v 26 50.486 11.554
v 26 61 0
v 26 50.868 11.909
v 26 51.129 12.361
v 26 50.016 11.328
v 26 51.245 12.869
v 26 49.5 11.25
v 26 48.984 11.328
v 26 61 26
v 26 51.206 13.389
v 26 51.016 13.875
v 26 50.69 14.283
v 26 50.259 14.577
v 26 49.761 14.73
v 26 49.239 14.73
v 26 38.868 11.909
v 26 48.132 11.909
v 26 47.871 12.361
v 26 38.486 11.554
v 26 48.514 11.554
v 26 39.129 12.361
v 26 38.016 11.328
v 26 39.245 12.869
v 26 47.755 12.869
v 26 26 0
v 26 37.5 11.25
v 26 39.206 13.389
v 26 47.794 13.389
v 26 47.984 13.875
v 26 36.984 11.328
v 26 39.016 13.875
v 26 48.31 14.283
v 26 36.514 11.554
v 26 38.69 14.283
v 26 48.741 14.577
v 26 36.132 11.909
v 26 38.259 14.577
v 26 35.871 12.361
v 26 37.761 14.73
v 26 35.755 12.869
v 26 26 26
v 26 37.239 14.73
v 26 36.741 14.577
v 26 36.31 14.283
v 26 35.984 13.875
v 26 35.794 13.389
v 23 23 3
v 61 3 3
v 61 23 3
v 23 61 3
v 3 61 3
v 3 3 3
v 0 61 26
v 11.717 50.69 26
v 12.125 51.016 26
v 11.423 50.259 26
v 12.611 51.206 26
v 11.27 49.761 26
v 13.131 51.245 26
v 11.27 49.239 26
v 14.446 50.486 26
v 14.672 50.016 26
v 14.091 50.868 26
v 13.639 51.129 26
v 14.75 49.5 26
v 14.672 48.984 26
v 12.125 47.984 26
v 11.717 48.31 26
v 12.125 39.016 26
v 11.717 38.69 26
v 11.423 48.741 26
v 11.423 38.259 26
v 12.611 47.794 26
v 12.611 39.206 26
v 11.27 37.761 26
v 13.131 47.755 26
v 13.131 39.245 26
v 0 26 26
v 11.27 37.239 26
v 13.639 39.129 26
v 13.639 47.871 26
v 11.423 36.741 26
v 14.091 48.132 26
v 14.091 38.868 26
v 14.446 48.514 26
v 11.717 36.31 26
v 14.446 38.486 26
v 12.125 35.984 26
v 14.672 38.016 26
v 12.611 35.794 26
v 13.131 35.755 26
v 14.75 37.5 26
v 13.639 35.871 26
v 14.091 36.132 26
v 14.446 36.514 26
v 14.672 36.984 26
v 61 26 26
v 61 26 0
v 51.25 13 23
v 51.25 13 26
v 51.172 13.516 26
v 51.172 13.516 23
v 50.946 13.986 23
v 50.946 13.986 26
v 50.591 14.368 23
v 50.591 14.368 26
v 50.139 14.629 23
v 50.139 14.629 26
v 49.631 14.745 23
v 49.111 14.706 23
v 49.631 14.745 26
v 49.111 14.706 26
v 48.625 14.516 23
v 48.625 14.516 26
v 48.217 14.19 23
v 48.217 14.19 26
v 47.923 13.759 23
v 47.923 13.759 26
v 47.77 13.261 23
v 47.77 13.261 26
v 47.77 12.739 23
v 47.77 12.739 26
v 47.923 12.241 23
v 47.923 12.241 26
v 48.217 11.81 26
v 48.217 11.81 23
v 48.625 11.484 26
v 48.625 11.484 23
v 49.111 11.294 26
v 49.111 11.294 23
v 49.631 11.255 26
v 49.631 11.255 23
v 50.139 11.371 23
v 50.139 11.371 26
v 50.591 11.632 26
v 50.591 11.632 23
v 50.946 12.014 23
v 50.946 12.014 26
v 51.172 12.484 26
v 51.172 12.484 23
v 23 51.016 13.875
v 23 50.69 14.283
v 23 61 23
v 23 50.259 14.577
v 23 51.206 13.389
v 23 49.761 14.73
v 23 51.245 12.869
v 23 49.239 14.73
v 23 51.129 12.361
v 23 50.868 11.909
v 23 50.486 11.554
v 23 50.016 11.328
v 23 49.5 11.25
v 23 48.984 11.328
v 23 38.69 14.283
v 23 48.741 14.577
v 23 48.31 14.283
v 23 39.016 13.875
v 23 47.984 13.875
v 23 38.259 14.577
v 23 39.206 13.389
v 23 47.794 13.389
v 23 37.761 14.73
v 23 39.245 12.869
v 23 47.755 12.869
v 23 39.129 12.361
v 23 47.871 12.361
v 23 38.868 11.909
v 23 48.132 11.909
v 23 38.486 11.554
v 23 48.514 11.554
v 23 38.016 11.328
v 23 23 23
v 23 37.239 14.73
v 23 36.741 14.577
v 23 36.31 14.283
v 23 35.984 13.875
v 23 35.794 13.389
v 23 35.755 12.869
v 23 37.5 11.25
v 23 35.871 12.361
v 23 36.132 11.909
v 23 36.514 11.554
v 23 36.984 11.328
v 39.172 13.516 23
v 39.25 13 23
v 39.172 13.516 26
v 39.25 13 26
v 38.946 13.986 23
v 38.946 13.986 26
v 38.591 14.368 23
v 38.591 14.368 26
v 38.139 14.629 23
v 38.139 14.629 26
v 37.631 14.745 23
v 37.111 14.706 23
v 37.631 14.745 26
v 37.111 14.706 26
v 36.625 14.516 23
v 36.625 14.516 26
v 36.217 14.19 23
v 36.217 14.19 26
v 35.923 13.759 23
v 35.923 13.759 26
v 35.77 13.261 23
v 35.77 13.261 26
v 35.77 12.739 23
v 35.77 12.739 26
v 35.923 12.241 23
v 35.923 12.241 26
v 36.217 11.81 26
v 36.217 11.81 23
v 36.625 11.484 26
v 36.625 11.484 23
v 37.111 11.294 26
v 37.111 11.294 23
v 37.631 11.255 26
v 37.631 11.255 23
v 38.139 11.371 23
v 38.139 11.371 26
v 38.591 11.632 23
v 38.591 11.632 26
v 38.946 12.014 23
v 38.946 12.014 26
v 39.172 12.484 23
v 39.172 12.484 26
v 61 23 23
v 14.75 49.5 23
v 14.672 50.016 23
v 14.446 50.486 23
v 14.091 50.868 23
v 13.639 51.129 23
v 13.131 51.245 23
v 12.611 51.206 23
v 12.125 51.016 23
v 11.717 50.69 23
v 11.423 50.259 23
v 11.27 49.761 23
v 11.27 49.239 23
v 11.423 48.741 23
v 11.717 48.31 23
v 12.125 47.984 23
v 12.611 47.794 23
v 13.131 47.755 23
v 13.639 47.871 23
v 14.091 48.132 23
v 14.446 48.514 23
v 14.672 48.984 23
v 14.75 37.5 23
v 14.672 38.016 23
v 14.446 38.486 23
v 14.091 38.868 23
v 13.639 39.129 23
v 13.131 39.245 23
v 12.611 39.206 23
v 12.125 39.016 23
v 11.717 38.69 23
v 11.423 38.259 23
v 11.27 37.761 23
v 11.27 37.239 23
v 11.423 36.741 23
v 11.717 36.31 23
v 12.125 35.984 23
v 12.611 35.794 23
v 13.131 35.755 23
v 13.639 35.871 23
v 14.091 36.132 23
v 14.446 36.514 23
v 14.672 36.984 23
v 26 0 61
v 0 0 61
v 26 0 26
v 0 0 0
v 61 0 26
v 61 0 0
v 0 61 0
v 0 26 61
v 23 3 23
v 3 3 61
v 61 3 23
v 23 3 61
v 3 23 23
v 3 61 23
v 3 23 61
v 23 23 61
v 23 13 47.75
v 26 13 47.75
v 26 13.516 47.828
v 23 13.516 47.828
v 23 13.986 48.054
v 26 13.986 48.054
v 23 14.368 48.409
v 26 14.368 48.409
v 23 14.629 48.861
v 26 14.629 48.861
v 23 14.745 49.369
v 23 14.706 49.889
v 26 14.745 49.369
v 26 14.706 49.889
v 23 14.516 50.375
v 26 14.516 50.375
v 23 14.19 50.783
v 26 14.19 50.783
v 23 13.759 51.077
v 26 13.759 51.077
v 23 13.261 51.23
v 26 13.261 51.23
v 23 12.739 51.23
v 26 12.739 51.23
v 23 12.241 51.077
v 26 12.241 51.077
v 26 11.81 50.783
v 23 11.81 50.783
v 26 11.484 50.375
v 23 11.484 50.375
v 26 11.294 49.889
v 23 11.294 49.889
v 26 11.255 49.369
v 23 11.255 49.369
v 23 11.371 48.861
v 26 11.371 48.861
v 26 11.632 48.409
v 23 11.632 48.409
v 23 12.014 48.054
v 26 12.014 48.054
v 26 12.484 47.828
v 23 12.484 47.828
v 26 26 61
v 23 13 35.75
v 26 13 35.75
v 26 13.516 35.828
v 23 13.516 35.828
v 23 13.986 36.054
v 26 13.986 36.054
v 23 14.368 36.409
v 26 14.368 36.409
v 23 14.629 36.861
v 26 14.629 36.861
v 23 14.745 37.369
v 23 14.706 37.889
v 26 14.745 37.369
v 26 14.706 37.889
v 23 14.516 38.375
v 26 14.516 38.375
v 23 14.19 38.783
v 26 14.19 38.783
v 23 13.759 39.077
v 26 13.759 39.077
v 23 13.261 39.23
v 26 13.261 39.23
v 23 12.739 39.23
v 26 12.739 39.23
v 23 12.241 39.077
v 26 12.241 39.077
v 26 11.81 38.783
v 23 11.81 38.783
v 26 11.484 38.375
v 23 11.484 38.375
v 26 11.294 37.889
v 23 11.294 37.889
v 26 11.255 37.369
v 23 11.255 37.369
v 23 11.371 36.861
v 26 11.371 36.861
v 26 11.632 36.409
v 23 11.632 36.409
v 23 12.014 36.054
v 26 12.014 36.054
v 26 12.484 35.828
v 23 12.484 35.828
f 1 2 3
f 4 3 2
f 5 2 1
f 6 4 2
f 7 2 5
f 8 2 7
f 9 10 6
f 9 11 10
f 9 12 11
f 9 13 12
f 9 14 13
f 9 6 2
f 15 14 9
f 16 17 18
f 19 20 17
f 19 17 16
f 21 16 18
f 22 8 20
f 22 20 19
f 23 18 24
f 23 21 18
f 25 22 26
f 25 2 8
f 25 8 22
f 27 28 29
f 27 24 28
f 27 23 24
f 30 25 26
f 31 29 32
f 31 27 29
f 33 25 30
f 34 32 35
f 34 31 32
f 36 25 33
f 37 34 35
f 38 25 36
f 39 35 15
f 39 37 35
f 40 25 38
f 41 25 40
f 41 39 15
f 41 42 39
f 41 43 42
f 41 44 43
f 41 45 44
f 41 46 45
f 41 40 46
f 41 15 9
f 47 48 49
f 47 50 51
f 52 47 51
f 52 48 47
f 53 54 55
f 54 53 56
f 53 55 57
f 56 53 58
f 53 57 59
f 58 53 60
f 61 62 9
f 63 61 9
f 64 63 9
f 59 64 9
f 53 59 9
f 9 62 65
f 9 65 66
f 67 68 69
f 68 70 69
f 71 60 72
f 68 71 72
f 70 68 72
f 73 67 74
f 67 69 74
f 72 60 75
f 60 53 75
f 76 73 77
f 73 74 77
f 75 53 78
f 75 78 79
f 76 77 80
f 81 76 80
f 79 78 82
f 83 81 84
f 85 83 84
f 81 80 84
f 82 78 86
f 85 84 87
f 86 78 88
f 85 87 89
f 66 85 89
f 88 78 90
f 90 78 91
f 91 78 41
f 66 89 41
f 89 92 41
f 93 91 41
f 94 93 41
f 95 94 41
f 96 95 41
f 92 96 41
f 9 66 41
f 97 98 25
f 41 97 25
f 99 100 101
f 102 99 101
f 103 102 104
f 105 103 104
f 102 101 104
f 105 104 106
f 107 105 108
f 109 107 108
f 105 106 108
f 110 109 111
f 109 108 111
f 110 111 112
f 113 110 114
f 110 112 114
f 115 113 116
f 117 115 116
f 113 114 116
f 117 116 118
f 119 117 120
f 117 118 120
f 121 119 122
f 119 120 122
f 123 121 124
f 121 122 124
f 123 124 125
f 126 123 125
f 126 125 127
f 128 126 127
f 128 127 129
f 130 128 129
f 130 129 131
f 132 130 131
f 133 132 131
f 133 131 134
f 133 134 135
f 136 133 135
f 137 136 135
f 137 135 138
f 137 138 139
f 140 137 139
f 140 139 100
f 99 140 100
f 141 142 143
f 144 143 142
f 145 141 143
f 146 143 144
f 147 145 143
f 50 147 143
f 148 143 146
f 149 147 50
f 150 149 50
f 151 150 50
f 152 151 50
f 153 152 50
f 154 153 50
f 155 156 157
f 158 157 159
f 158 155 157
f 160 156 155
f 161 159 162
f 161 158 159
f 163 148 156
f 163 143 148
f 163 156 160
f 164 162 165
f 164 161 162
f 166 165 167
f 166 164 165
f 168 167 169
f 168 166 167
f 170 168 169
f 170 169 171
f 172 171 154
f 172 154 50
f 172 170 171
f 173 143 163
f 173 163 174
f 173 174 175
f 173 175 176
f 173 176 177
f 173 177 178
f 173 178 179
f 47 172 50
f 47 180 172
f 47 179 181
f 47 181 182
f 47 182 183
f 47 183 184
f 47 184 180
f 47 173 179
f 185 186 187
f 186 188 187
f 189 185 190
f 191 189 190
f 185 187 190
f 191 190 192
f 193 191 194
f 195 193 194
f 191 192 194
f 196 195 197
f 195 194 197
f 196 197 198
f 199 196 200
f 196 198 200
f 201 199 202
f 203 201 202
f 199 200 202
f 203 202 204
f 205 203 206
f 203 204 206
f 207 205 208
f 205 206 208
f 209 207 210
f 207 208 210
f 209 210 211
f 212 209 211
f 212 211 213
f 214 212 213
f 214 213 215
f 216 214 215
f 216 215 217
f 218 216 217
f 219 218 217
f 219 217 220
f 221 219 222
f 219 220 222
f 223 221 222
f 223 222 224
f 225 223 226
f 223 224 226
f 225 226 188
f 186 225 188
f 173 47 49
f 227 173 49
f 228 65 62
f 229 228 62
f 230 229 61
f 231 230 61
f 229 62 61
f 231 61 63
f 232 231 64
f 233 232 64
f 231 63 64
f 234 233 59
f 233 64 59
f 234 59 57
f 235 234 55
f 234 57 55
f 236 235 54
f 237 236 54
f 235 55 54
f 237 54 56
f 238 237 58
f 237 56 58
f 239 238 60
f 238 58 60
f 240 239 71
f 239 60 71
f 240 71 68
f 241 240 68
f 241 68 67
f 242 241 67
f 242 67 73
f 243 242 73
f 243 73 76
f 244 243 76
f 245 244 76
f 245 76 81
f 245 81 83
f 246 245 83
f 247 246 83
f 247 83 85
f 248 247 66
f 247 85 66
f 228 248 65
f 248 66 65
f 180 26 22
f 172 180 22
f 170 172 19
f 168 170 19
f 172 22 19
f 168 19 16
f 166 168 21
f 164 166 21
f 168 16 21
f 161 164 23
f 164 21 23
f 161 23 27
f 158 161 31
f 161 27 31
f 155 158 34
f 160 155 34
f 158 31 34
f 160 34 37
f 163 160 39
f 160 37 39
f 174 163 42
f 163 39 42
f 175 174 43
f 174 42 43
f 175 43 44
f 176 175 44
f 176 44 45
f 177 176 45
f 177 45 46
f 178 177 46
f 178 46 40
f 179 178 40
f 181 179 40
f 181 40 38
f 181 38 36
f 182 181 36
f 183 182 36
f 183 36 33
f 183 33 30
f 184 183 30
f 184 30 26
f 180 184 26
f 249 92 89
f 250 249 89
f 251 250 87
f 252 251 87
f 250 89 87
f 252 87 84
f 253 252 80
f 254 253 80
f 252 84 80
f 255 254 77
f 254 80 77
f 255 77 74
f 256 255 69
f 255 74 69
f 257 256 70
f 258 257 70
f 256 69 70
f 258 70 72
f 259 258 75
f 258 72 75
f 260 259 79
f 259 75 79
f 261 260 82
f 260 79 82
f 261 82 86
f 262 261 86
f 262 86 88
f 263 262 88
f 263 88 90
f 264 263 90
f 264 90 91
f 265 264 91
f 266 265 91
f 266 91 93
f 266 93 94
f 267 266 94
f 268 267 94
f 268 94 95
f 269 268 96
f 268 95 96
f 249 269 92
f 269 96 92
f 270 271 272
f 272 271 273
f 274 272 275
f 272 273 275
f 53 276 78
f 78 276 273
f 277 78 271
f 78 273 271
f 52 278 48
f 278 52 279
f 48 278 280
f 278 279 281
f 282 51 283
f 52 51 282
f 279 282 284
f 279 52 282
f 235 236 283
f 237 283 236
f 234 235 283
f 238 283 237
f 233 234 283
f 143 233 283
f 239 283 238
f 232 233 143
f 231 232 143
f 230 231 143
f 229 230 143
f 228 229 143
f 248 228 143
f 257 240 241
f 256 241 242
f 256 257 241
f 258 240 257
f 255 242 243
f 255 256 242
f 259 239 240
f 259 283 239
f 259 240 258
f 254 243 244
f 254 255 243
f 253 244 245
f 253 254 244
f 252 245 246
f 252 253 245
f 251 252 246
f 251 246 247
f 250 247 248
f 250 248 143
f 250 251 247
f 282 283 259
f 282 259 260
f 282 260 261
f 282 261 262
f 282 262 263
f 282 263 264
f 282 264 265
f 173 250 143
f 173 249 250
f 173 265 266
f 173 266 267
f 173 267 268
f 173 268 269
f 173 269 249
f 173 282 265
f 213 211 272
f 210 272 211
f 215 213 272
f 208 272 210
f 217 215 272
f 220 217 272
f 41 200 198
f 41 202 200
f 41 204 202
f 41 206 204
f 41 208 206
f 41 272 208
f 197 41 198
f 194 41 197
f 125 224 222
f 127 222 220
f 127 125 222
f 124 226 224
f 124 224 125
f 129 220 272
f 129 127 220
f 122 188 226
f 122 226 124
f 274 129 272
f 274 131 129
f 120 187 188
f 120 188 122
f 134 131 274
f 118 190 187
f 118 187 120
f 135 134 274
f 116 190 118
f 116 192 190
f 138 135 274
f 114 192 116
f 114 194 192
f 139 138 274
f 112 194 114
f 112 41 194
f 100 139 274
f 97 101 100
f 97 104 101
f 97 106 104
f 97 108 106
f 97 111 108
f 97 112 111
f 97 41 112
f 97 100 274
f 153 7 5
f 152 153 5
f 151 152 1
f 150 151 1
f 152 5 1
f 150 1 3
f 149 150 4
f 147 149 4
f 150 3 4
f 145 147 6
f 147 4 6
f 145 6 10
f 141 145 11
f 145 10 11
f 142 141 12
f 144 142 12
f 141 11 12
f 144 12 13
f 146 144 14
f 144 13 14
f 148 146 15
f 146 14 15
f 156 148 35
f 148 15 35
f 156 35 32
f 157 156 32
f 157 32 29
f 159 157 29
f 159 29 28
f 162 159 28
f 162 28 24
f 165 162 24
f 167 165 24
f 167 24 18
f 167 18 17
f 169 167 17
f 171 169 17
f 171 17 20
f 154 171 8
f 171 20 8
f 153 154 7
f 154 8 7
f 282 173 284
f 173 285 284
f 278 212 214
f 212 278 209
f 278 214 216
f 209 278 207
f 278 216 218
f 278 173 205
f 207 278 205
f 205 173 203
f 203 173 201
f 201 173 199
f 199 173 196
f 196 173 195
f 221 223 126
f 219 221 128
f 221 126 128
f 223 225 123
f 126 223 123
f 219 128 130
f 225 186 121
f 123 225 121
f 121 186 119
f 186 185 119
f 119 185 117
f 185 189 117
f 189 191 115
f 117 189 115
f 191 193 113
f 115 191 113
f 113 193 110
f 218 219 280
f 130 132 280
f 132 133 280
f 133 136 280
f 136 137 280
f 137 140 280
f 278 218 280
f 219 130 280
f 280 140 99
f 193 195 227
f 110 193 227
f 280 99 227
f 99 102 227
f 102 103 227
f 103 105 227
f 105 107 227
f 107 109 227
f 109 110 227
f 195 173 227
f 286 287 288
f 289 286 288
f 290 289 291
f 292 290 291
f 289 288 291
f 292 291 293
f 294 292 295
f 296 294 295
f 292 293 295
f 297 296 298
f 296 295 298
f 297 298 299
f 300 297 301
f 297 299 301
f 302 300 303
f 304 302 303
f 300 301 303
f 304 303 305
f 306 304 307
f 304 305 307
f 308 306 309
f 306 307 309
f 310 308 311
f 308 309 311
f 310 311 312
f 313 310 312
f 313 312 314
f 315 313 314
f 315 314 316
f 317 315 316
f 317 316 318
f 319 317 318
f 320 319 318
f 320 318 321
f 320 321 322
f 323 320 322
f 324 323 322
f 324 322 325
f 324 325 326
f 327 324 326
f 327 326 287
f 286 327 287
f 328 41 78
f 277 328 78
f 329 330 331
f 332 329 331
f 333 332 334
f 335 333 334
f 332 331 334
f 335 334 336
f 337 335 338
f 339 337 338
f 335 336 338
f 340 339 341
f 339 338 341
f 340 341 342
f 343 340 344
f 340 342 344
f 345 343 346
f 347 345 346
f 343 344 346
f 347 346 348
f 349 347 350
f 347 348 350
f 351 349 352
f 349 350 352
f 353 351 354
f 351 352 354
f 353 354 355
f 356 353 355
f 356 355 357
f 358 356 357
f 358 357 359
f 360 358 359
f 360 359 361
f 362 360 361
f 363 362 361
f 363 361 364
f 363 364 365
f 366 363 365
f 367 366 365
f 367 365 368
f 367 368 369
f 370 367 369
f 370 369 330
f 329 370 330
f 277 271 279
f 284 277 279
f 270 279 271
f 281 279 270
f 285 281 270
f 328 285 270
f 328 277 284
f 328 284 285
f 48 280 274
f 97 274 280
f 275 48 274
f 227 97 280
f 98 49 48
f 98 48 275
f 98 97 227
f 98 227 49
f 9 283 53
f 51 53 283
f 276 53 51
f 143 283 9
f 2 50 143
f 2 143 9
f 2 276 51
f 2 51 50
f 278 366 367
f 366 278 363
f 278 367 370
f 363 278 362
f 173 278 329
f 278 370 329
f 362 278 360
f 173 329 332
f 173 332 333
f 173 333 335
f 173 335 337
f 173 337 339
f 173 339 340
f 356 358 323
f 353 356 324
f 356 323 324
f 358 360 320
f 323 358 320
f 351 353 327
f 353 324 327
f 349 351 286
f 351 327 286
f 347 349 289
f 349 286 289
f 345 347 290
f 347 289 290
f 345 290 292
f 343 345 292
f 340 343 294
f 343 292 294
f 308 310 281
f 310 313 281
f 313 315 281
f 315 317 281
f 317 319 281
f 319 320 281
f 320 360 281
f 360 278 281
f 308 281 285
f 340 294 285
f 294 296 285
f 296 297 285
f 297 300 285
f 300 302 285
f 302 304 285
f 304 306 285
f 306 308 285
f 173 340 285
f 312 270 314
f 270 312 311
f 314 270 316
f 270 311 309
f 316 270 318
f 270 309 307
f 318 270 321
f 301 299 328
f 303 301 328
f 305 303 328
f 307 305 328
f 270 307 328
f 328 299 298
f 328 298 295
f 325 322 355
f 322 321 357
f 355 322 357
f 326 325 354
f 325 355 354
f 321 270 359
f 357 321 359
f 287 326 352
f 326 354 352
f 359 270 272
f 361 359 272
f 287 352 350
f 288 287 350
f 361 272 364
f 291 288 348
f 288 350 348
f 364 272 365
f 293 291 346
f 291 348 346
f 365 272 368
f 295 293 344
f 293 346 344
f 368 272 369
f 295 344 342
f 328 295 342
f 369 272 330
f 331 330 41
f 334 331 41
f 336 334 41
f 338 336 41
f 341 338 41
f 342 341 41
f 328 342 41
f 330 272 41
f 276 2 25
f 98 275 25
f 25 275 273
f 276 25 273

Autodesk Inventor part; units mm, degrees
ref_plane "YZ Plane" through (0, 0, 0) normal (1, 0, 0) x (0, 1, 0)
ref_plane "XZ Plane" through (0, 0, 0) normal (0, 1, 0) x (-1, 0, 0)
ref_plane "XY Plane" through (0, 0, 0) normal (0, 0, 1) x (1, 0, 0)
sketch "Boceto1" plane through (0, 0, 0) normal (0, 0, 1) x (1, 0, 0)
  line L0 (0, 0) -> (50, 0)
  line L1 (50, 0) -> (50, 26)
  line L2 (50, 26) -> (26, 26)
  line L3 (0, 26) -> (0, 0)
  line L4 (0, 0) -> (26, 0)
  line L5 (26, 26) -> (26, 50)
  line L6 (26, 50) -> (0, 50)
  line L7 (0, 50) -> (0, 0)
  line L8 (0, 0) -> (50, 0)
  line L9 (50, 0) -> (50, 3)
  line L10 (50, 3) -> (0, 3)
  line L11 (0, 3) -> (0, 0)
  line L12 (0, 50) -> (3, 50)
  line L13 (3, 50) -> (3, 0)
  line L14 (3, 0) -> (0, 0)
  line L15 (0, 0) -> (0, 50)
  line L16 (26, 50) -> (23, 50)
  line L17 (23, 50) -> (23, 24)
  line L18 (23, 24) -> (26, 24)
  line L19 (26, 24) -> (26, 50)
  line L20 (50, 26) -> (23, 26)
  line L21 (23, 26) -> (23, 23)
  line L22 (23, 23) -> (50, 23)
  line L23 (50, 23) -> (50, 26)
  line L24 (23, 50) -> (1.5, 50)
  line L25 (3, 3) -> (50, 3)
  line L26 (50, 23) -> (23, 23)
  point P0 (3, 3)
  dimension "d0" = 50
  dimension "d1" = 26
  dimension "d2" = 26
  dimension "d3" = 50
  dimension "d4" = 50
  dimension "d5" = 3
  dimension "d6" = 3
  dimension "d7" = 50
  dimension "d8" = 3
  dimension "d9" = 26
  dimension "d10" = 27
  dimension "d11" = 3
extrude "Extrusión1" add sketch "Boceto1" along normal blind 26 contours L3 L10 L13 L0 | L13 L10 L1 L0
extrude "Extrusión2" add sketch "Boceto1" along normal blind 26 contours L3 L7 L6 L13 L10
extrude "Extrusión3" add sketch "Boceto1" along normal blind 26 contours L22 L21 L18 L19 L2 L1 | L20 L19 L18 L17
extrude "Extrusión4" add sketch "Boceto1" along normal blind 26 contours L6 L5 L20 L17
sketch "Boceto2" plane through (0, 0, 26) normal (0, 0, 1) x (1, 0, 0)
  line L0 (3, 50) -> (0, 50) projected
  line L1 (26, 50) -> (23, 50) projected
  line L2 (0, 50) -> (26, 50)
  line L3 (3, 50) -> (23, 50)
  line L4 (23, 50) -> (23, 23) projected
  line L5 (23, 23) -> (50, 23) projected
  line L6 (23, 23) -> (50, 23)
  line L7 (50, 0) -> (50, 3) projected
  line L8 (50, 23) -> (50, 3)
  line L9 (50, 3) -> (3, 3) projected
  line L10 (50, 3) -> (3, 3)
  line L11 (3, 3) -> (3, 50)
  point P0 (0, 0)
extrude "Extrusión5" add sketch "Boceto2" against normal blind 3
extrude "Extrusión6" add sketch "Boceto1" along normal blind 3 contours L13 L6 L17 L21 L22 L1 L10
sketch "Boceto3" plane through (0, 0, 26) normal (0, 0, 1) x (1, 0, 0)
  line L0 (0, 0) -> (50, 0) projected
  line L1 (0, 0) -> (26, 0)
  line L2 (0, 0) -> (26, 0) construction
  line L3 (50, 26) -> (26, 26) projected
  line L4 (26, 0) -> (26, 26)
  line L5 (26, 26) -> (0, 26)
  line L6 (3, 3) -> (3, 50) projected
  line L7 (0, 26) -> (0, 0)
  line L8 (3, 3) -> (50, 3) projected
  line L9 (3, 3) -> (23, 3)
  line L10 (23, 3) -> (23, 23)
  line L11 (23, 23) -> (3, 23)
  line L12 (3, 23) -> (3, 3)
  dimension "d24" = 26
  dimension "d25" = 0
  dimension "d26" = 20
  dimension "d27" = 20
extrude "Extrusión7" cut sketch "Boceto3" against normal blind 3 contours L8 L6 L11 L10
sketch "Boceto4" plane through (0, 0, 26) normal (0, 0, 1) x (1, 0, 0)
  line L0 (0, 0) -> (26, 0)
  line L1 (0, 0) -> (50, 0) projected
  line L2 (0, 0) -> (26, 0) construction
  line L3 (26, 0) -> (26, 26)
  line L4 (26, 26) -> (0, 26)
  line L5 (3, 23) -> (23, 23) projected
  line L6 (0, 50) -> (0, 0) projected
  line L7 (0, 26) -> (0, 0)
  line L8 (50, 23) -> (23, 23) projected
  line L9 (3, 23) -> (23, 23)
  line L10 (23, 23) -> (23, 3) projected
  line L11 (23, 23) -> (23, 3)
  line L12 (50, 3) -> (3, 3) projected
  line L13 (23, 3) -> (3, 3)
  line L14 (3, 3) -> (3, 23)
  dimension "d30" = 26
  dimension "d31" = 0
  dimension "d32" = 26
  dimension "d33" = 90
extrude "Extrusión8" add sketch "Boceto4" along normal blind 35 contours L6 L4 L3 L8 L5 L14 L12 L0 | L12 L10 L8 L3
sketch "Boceto5" plane through (26, 0, 26) normal (1, 0, 0) x (0, 0, -1)
  circle A0 centre (-23.5, 13) radius 1.75
  circle A1 centre (-11.5, 13) radius 1.75
  line L0 (0, 26) -> (-35, 26) projected
  line L1 (-35, 0) -> (-35, 26) projected
  line L2 (0, 0) -> (0, 26) projected
  point P0 (26, 0)
  dimension "d36" = 3.5
  dimension "d37" = 3.5
  dimension "d38" = 13
  dimension "d39" = 13
  dimension "d40" = 12
  dimension "d41" = 11.5
  dimension "d42" = 35
  dimension "d43" = 11.5
sketch "Boceto6" plane through (50, 0, 26) normal (1, 0, 0) x (0, 0, -1)
  line L0 (26, 26) -> (0, 26) projected
  line L1 (26, 26) -> (26, 50) projected
  line L2 (0, 26) -> (26, 26)
  line L3 (26, 50) -> (26, 0) projected
  line L4 (26, 26) -> (26, 0)
  line L5 (26, 0) -> (0, 0)
  line L6 (26, 0) -> (-35, 0) projected
  line L7 (23, 23) -> (3, 23) projected
  line L8 (3, 23) -> (23, 23)
  line L9 (23, 23) -> (23, 3)
  line L10 (23, 3) -> (3, 3)
  line L11 (23, 3) -> (-35, 3) projected
  line L12 (-35, 23) -> (3, 23) projected
  line L13 (3, 3) -> (3, 23)
  line L14 (0, 26) -> (0, 0)
extrude "Extrusión9" add sketch "Boceto6" along normal blind 11 contours L3 L5 L14 L11 L10 L9 L7 L12 L0 | L12 L13 L11 L14
sketch "Boceto7" plane through (0, 50, 26) normal (0, 1, 0) x (1, 0, 0)
  line L0 (3, 3) -> (23, 3) projected
  line L1 (3, 3) -> (23, 3)
  line L2 (23, 3) -> (23, 23)
  line L3 (23, 23) -> (3, 23)
  line L4 (3, 23) -> (3, 3)
  line L5 (26, 26) -> (26, 0) projected
  line L6 (26, 26) -> (0, 26)
  line L7 (0, 26) -> (0, 0)
  line L8 (0, 0) -> (26, 0)
  line L9 (26, 0) -> (26, 26)
  dimension "d46" = 20
  dimension "d47" = 20
  dimension "d48" = 26
  dimension "d49" = 26
extrude "Extrusión10" add sketch "Boceto7" along normal blind 11
sketch "Boceto8" plane through (0, 0, 26) normal (0, 0, 1) x (1, 0, 0)
  circle A0 centre (49.5, 13) radius 1.75
  circle A1 centre (37.5, 13) radius 1.75
  line L0 (61, 26) -> (61, 0) projected
  line L1 (26, 26) -> (61, 26) projected
  point P0 (0, 0)
  dimension "d52" = 3.5
  dimension "d53" = 3.5
  dimension "d54" = 11.5
  dimension "d55" = 12
  dimension "d56" = 13
  dimension "d57" = 13
extrude "Extrusión11" cut sketch "Boceto5" against normal up to next contours A0
extrude "Extrusión12" cut sketch "Boceto5" against normal up to next contours A1
extrude "Extrusión13" cut sketch "Boceto8" against normal up to next contours A1
extrude "Extrusión14" cut sketch "Boceto8" against normal up to next contours A0
sketch "Boceto9" plane through (0, 0, 26) normal (0, 0, 1) x (1, 0, 0)
  circle A0 centre (13, 37.5) radius 1.75
  circle A1 centre (13, 49.5) radius 1.75
  line L0 (0, 26) -> (0, 61) projected
  line L1 (0, 61) -> (26, 61) projected
  point P0 (0, 0)
  dimension "d66" = 3.5
  dimension "d67" = 3.5
  dimension "d68" = 13
  dimension "d69" = 13
  dimension "d70" = 11.5
  dimension "d71" = 12
sketch "Boceto10" plane through (26, 26, 26) normal (1, 0, 0) x (0, 0, -1)
  circle A0 centre (13, 23.5) radius 1.75
  circle A1 centre (13, 11.5) radius 1.75
  line L0 (0, 0) -> (0, 35) projected
  line L1 (0, 35) -> (26, 35) projected
  point P0 (26, -26)
  dimension "d72" = 3.5
  dimension "d73" = 3.5
  dimension "d74" = 13
  dimension "d75" = 13
  dimension "d76" = 12
  dimension "d77" = 11.5
extrude "Extrusión15" cut sketch "Boceto9" against normal up to next contours A1
extrude "Extrusión16" cut sketch "Boceto9" against normal up to next contours A0
extrude "Extrusión17" cut sketch "Boceto10" against normal up to next contours A0
extrude "Extrusión18" cut sketch "Boceto10" against normal up to next contours A1
sketch "Boceto12" plane through (3, 3, 61) normal (0, 1, 0) x (1, 0, 0)
  line L0 (58, 58) -> (0, 58) projected
  line L1 (0, 58) -> (0, 0) projected
  line L2 (20, 0) -> (0, 0) projected
  line L3 (20, 0) -> (20, 38) projected
  line L4 (20, 38) -> (58, 38) projected
  line L5 (58, 58) -> (58, 38) projected
  line L6 (23, 35) -> (23, 61) projected
  line L7 (23, 61) -> (-3, 61) projected
  line L8 (-3, 61) -> (-3, 35) projected
  line L9 (-3, 35) -> (23, 35) projected
  line L10 (0, 38) -> (0, 58) projected
  line L11 (0, 58) -> (20, 58) projected
  line L12 (20, 58) -> (20, 38) projected
  line L13 (20, 38) -> (0, 38) projected
  line L14 (23, 35) -> (23, 61) projected
  line L15 (23, 61) -> (-3, 61) projected
  line L16 (-3, 61) -> (-3, 35) projected
  line L17 (-3, 35) -> (23, 35) projected
  line L18 (0, 38) -> (0, 58) projected
  line L19 (0, 58) -> (20, 58) projected
  line L20 (20, 58) -> (20, 38) projected
  line L21 (20, 38) -> (0, 38) projected
  line L22 (20, 58) -> (20, 38) projected
  line L23 (0, 38) -> (0, 58) projected
  line L24 (20, 38) -> (0, 38) projected
  line L25 (0, 0) -> (20, 0) projected
  line L26 (0, 58) -> (20, 58) projected
  line L27 (58, 58) -> (0, 58) projected
  line L28 (20, 58) -> (58, 58) projected
  line L29 (58, 38) -> (58, 58) projected
properties part number "esquina20mm"
